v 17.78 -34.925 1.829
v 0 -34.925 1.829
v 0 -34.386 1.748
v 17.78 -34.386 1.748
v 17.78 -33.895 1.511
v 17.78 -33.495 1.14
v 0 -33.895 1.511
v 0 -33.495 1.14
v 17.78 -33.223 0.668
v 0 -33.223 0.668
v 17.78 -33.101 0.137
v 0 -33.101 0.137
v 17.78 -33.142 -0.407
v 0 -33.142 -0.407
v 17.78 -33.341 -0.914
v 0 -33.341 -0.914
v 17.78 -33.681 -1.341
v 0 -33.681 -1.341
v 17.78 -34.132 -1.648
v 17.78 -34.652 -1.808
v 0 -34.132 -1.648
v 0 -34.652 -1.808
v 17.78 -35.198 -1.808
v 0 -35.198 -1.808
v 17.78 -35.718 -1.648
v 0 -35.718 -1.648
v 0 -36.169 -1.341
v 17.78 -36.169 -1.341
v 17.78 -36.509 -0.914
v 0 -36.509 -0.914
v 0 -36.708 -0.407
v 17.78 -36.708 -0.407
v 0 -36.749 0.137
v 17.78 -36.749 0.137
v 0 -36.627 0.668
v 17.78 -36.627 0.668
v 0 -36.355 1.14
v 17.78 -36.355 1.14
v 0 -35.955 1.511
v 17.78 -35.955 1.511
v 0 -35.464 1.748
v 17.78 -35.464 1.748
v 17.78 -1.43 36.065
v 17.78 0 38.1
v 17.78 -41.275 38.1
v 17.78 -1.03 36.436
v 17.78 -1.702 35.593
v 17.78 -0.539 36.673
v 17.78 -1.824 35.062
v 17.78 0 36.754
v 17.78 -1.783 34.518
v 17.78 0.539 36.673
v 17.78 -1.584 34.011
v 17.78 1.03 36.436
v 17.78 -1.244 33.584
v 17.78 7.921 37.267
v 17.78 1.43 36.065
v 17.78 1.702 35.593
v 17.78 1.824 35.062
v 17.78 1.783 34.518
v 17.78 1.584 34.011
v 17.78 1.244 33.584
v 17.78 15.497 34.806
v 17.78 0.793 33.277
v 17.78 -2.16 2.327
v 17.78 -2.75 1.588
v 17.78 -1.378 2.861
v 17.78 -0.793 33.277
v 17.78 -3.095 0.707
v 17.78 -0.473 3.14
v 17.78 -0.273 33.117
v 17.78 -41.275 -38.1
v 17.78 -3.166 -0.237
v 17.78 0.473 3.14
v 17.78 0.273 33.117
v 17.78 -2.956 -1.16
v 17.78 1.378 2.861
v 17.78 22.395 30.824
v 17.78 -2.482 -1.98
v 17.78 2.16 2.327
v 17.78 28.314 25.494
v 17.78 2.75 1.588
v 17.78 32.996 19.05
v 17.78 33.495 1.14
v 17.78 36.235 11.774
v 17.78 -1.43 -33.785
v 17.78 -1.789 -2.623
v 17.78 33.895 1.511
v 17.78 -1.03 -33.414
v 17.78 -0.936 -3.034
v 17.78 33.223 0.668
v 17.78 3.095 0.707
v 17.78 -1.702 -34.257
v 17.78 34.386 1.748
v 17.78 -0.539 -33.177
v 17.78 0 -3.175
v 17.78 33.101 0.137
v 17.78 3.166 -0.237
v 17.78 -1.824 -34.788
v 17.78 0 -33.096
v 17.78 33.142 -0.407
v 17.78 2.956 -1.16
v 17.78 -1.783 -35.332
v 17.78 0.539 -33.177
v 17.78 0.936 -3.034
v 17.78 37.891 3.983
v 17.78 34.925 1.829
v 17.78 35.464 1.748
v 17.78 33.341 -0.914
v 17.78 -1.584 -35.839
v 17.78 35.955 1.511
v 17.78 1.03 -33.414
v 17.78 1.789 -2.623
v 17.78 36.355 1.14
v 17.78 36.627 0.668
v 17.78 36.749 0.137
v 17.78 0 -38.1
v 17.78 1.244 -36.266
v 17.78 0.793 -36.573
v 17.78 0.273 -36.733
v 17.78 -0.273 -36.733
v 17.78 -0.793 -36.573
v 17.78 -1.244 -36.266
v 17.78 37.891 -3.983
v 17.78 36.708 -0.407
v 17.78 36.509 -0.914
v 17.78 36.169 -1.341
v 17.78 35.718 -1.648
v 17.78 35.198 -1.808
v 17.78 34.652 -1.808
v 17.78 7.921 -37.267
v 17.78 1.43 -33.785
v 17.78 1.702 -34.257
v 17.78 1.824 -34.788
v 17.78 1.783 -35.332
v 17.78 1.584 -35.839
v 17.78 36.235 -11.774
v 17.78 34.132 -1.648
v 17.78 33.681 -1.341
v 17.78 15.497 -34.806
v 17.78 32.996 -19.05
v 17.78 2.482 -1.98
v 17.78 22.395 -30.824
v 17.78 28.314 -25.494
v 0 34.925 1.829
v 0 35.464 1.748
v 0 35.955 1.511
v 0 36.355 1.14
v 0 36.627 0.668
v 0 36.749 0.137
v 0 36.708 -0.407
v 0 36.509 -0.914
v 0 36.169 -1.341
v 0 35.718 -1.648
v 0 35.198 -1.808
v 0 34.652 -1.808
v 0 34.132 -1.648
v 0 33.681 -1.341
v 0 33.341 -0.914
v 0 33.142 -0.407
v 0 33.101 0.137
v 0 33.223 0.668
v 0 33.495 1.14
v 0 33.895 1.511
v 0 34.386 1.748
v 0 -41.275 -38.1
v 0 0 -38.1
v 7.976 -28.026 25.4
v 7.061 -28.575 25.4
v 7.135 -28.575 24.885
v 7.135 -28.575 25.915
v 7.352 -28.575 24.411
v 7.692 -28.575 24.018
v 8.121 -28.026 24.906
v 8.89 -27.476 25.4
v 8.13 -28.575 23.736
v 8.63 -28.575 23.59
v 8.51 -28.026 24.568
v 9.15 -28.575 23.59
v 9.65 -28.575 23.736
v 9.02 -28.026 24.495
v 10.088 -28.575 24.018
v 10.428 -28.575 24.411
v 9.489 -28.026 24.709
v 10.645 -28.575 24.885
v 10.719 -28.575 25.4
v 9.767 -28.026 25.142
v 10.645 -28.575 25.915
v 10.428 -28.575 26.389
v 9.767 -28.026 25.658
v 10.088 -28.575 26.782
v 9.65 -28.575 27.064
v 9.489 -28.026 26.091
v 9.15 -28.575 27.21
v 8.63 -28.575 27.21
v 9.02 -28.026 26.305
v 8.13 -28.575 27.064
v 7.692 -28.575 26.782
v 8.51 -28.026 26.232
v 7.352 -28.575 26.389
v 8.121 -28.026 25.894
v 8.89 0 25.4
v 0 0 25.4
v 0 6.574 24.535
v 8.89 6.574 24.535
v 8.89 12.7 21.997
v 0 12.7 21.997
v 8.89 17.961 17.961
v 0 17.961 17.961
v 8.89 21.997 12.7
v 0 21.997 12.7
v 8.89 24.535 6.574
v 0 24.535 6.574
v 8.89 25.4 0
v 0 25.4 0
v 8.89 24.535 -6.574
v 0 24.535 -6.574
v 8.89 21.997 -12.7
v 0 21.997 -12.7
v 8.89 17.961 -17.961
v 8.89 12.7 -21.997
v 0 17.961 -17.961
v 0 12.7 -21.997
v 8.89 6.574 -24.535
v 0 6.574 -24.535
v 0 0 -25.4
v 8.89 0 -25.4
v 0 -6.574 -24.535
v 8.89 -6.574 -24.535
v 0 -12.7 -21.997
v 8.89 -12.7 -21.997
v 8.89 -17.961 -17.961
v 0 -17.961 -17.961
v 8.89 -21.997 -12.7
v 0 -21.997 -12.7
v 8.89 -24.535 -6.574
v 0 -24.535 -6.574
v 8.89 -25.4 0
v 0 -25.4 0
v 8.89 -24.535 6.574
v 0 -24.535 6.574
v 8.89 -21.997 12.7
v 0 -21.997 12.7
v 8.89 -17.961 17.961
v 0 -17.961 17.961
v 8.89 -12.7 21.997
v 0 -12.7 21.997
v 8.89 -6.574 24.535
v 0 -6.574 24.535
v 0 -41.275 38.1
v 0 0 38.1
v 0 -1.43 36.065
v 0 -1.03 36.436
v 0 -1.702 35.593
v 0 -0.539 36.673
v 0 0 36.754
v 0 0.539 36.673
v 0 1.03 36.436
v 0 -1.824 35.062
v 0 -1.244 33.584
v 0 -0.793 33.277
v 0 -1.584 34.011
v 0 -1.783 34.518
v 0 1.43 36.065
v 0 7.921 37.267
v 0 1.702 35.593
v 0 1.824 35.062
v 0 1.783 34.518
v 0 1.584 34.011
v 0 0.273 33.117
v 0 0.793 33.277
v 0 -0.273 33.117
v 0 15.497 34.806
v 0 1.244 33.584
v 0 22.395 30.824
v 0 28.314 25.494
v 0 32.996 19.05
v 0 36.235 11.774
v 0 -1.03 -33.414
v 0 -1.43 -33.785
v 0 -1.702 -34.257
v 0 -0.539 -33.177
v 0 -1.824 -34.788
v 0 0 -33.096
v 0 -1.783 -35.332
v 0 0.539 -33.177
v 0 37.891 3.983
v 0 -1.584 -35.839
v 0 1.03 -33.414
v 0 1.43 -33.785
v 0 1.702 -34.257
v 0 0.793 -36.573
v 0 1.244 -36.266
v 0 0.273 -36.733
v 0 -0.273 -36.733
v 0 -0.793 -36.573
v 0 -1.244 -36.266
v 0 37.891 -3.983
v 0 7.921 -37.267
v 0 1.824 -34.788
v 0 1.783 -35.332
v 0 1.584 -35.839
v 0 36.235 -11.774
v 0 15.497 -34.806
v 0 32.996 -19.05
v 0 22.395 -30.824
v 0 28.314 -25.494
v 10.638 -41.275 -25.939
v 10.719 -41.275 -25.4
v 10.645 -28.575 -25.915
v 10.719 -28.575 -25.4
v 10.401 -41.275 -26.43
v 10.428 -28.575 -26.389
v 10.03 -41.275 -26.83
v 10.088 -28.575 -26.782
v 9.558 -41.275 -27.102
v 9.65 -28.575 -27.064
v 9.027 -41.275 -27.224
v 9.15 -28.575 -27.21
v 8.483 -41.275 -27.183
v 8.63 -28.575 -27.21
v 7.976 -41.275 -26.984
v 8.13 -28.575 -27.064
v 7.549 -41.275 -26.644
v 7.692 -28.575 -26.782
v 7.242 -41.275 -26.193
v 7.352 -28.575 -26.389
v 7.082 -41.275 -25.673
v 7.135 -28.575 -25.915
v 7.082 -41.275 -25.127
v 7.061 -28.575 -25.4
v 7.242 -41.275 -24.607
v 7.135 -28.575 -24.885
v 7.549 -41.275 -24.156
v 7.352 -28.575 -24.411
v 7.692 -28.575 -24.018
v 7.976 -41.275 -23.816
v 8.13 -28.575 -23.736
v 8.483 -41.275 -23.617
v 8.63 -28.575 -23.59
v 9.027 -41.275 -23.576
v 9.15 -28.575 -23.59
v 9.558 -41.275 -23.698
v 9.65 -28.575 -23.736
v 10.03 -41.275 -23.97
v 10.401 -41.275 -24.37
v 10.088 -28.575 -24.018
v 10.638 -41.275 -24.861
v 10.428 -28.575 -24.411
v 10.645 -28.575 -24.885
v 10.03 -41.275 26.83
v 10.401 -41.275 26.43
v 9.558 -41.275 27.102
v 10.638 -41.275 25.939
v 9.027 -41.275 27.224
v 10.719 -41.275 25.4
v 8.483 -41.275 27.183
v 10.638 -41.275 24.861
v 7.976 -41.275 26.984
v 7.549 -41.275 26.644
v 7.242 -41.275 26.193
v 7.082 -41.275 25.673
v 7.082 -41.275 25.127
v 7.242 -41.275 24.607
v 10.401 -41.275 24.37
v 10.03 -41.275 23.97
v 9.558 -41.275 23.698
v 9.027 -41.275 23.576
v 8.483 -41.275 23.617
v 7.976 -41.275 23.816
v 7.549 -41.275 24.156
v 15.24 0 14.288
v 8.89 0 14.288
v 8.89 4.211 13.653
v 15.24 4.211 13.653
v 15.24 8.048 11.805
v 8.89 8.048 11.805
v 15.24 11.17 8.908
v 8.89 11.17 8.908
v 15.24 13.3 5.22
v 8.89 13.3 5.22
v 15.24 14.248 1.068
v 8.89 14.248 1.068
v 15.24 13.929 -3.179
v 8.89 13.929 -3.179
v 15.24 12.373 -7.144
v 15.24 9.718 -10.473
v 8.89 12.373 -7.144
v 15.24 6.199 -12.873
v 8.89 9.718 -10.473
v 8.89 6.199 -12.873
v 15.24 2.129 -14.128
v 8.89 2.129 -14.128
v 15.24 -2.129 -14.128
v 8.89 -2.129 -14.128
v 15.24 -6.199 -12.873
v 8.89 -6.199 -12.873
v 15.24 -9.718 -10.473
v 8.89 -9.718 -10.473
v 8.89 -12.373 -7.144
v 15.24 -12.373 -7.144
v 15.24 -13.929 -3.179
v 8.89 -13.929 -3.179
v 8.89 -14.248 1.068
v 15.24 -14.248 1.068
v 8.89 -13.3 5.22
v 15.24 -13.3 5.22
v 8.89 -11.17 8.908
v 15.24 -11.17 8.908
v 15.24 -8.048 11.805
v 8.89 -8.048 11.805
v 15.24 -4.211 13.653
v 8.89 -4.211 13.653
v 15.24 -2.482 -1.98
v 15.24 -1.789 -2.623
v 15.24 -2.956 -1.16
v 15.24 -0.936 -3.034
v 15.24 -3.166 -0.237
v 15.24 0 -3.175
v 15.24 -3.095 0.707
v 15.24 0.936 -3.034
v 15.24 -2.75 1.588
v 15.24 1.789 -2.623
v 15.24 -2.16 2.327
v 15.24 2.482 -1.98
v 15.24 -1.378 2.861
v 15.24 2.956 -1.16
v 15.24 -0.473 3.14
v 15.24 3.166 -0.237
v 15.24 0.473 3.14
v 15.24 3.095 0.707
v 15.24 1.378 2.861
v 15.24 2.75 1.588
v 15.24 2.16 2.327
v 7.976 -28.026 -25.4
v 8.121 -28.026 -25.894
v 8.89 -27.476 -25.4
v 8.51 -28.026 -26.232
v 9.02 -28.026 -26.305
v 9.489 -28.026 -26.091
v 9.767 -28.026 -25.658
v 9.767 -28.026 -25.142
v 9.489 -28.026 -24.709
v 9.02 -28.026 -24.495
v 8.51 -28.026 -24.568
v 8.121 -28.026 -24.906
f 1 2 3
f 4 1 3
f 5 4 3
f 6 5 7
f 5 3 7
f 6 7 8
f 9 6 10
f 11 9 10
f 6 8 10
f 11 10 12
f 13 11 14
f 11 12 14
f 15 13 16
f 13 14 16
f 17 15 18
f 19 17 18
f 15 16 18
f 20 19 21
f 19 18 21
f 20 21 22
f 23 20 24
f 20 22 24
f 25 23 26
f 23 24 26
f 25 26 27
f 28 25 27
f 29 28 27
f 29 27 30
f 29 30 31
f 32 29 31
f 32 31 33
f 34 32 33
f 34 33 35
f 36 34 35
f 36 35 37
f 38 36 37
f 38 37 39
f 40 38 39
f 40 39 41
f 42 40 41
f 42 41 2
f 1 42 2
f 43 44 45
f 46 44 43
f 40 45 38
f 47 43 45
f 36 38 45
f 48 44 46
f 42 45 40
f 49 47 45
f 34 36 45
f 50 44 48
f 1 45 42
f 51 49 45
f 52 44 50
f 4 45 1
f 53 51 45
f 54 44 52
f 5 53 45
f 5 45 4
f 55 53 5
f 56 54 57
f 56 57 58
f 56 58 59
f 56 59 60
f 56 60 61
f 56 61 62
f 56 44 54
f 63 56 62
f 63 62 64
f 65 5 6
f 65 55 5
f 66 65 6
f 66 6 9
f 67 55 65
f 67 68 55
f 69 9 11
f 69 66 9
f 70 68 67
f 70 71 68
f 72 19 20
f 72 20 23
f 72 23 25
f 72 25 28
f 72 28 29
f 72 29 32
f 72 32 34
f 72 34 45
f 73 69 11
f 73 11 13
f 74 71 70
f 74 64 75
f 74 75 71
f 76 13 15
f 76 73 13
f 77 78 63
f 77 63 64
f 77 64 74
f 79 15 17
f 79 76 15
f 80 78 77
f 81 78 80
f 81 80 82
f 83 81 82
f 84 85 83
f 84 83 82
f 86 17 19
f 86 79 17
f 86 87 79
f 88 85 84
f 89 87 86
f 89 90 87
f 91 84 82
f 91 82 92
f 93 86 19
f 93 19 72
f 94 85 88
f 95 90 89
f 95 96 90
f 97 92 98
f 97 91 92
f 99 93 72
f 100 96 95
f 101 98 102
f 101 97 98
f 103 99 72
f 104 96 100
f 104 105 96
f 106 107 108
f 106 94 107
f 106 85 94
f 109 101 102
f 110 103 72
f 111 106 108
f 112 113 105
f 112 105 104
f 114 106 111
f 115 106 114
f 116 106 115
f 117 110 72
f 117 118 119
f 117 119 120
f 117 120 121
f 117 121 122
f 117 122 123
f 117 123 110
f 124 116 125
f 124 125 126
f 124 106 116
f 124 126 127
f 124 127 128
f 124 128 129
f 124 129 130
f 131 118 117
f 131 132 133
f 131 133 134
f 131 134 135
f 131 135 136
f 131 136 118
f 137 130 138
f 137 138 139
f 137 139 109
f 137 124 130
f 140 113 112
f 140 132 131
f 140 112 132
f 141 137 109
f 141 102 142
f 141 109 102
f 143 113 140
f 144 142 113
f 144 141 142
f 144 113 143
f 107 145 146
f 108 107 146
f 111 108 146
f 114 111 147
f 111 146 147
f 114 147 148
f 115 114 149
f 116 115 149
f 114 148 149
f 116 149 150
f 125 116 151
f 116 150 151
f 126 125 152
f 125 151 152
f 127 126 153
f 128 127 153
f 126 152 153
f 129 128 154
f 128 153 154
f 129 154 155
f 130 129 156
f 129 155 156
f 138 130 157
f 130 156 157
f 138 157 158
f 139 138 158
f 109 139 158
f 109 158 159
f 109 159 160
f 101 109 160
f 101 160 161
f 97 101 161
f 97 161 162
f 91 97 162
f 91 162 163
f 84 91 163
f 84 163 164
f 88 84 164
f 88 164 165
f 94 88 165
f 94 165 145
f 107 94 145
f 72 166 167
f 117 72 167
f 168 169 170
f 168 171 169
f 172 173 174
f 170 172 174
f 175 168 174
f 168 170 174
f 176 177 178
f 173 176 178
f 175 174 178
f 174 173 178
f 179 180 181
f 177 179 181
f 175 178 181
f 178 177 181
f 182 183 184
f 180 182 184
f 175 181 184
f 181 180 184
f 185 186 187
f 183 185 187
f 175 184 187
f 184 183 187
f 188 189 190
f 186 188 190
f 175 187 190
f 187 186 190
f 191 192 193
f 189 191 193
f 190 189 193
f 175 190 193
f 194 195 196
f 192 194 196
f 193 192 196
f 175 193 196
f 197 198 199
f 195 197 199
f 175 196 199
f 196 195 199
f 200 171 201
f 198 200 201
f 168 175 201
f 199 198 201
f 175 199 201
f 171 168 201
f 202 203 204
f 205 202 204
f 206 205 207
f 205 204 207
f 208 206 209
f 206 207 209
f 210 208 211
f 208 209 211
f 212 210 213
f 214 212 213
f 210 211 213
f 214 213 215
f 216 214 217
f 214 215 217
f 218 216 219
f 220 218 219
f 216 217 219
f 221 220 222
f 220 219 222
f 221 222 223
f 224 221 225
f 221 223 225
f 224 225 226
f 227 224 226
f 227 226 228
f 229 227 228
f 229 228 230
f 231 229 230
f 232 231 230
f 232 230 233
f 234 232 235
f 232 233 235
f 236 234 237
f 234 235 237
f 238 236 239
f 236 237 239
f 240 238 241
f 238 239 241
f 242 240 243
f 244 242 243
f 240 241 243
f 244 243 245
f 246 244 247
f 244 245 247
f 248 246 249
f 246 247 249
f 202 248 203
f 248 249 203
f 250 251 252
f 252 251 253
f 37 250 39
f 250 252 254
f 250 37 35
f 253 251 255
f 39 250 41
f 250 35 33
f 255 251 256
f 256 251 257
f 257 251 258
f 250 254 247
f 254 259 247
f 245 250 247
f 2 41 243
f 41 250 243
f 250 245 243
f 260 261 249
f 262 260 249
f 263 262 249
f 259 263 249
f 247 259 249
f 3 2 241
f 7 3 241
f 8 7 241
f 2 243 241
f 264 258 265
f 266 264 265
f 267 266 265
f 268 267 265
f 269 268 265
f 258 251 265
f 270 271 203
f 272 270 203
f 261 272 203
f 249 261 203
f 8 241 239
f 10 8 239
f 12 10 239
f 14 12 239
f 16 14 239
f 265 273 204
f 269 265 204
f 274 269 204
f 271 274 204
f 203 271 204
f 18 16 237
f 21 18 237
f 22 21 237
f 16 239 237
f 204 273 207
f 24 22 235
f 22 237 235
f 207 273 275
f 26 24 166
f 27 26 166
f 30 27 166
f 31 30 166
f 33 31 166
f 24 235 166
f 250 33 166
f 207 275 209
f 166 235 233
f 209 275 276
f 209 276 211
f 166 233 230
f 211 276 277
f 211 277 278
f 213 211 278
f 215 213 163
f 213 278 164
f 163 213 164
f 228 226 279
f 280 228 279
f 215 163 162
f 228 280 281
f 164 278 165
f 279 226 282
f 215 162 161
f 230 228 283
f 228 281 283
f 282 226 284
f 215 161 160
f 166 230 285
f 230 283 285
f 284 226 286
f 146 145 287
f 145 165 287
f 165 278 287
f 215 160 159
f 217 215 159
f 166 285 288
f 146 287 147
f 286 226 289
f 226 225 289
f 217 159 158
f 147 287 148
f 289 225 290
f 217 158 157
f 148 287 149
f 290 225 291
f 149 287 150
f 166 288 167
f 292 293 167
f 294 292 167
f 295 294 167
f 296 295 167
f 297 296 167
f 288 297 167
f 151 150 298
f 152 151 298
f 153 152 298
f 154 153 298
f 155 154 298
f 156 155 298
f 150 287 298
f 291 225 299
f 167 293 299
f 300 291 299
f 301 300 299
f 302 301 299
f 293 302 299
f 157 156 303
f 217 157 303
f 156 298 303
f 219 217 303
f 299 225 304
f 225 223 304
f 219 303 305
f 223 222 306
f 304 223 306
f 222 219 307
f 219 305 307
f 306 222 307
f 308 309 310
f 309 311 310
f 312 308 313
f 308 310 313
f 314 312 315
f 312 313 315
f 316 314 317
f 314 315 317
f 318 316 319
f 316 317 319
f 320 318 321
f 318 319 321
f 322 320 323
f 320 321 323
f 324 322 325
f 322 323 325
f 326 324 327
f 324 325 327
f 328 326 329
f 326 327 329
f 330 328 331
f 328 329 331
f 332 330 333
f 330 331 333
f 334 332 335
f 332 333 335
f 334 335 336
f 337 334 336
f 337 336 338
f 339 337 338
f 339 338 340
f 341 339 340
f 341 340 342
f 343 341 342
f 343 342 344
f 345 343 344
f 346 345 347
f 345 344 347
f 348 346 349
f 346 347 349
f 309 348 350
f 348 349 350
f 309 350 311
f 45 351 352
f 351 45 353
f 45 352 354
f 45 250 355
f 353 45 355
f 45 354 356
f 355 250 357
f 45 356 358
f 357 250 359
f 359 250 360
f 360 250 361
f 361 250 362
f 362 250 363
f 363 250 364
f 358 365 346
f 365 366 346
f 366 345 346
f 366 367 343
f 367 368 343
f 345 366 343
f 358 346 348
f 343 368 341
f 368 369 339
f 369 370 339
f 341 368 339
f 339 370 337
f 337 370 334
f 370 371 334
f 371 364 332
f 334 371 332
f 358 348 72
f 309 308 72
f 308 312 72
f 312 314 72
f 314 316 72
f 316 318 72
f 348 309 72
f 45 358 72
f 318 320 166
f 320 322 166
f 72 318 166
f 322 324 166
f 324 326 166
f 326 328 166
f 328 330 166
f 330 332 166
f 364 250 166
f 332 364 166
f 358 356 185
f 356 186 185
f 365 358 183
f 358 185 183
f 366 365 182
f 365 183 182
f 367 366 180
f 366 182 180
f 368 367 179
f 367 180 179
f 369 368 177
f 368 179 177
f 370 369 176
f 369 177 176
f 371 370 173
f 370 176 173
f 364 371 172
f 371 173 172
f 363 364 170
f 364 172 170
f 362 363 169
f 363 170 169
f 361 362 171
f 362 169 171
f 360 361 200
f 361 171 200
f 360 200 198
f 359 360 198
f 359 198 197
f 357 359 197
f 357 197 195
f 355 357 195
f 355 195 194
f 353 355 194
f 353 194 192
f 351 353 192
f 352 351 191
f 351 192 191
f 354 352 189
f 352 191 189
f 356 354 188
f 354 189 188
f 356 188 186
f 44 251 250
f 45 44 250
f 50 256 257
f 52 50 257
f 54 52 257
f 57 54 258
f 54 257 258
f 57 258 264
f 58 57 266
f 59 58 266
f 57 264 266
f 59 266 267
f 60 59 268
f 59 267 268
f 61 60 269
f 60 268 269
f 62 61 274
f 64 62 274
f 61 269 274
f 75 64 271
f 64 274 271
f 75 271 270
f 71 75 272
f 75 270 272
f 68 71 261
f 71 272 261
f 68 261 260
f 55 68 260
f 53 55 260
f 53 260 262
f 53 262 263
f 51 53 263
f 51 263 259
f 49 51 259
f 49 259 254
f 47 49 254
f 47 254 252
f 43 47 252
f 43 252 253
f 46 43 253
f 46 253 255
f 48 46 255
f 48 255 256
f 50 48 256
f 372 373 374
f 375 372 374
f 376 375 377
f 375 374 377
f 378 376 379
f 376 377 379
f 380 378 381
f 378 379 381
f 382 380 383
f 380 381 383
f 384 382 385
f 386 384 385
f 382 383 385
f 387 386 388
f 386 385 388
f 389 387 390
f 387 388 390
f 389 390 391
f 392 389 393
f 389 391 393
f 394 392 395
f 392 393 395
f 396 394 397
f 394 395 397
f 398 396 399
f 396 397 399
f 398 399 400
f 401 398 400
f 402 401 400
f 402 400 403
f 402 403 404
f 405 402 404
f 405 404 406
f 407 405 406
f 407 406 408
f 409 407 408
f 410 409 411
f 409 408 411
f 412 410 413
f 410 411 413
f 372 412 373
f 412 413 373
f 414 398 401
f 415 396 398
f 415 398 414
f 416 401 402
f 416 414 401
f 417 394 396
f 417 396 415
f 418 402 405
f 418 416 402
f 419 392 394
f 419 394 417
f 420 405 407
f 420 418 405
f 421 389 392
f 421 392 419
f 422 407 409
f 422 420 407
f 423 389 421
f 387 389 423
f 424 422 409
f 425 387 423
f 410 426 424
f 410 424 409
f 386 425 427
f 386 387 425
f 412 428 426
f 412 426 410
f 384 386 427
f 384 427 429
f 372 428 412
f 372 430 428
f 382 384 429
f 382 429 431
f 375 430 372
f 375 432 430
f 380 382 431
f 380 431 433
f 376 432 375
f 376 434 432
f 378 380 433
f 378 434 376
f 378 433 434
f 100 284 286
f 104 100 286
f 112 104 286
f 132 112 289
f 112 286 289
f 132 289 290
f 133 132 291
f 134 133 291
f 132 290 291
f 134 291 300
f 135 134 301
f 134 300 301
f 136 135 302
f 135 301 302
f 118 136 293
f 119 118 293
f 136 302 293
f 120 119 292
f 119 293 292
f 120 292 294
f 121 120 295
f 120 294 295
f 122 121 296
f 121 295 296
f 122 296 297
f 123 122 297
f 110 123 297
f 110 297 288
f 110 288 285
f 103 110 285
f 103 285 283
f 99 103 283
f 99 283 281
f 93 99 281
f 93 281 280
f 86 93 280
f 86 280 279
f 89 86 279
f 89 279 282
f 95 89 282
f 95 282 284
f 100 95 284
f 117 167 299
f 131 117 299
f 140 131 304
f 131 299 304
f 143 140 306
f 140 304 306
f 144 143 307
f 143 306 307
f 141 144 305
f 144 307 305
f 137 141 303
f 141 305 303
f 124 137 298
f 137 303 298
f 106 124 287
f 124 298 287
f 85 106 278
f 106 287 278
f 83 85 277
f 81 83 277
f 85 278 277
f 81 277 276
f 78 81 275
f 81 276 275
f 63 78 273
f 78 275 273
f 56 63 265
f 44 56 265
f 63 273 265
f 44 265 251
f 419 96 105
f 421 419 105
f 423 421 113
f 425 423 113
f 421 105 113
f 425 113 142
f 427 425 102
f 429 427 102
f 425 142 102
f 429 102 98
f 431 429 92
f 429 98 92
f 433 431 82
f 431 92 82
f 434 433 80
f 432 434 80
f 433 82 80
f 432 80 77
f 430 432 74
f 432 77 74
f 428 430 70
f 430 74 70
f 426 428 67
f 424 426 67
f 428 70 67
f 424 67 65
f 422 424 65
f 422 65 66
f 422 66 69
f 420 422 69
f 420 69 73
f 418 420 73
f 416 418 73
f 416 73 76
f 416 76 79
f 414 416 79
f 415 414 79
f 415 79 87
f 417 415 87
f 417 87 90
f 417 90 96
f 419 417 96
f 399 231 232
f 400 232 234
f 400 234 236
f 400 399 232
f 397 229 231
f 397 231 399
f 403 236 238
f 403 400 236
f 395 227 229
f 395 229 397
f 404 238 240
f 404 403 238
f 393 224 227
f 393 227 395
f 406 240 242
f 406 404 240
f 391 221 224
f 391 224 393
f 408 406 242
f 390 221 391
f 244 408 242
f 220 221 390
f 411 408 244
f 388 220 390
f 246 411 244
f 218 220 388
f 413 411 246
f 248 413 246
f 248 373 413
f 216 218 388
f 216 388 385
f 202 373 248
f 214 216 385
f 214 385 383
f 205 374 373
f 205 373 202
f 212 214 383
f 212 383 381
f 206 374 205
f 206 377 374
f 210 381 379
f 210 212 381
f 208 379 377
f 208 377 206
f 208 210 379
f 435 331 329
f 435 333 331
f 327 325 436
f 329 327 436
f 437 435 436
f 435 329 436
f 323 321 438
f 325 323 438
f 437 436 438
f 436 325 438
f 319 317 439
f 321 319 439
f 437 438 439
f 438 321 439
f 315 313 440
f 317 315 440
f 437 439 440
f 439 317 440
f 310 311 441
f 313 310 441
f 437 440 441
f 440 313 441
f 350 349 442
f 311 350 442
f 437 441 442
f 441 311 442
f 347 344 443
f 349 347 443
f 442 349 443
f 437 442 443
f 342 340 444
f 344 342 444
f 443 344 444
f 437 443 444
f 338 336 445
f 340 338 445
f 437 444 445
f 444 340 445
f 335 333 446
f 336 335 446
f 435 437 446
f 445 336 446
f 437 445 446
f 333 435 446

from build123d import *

# Parameters (mm, degrees)
SKETCH1_R                 = 38.1
BOSS_EXTRUDE1_DEPTH       = 17.78
SKETCH2_R                 = 25.4
CUT_EXTRUDE1_DEPTH        = 8.89
F_6_CLEARANCE_HOLE1_D     = 3.6576
SKETCH6_R                 = 14.2875
CUT_EXTRUDE2_DEPTH        = 6.35
SKETCH7_R                 = 3.175
CUT_EXTRUDE3_DEPTH        = 59.918282604
F_6_CLEARANCE_HOLE2_D     = 3.6576
F_6_CLEARANCE_HOLE2_DEPTH = 12.7
F_6_CLEARANCE_HOLE2_TIP   = 1.0988539


with BuildPart() as part:
    # Sketch1 → Boss-Extrude1 (new body)
    with BuildSketch(Plane(origin=(0, 0, 0), x_dir=(0, 0, -1), z_dir=(1, 0, 0))):
        with BuildLine():
            ThreePointArc((38.1, 0), (0, -38.1), (-38.1, 0))
            Line((-38.1, 0), (-38.1, -41.275))
            Line((-38.1, -41.275), (38.1, -41.275))
            Line((38.1, -41.275), (38.1, 0))
        make_face()
        Circle(SKETCH1_R)
    extrude(amount=BOSS_EXTRUDE1_DEPTH)

    # Sketch2 → Cut-Extrude1 (cut)
    with BuildSketch(Plane.ZY):
        Circle(SKETCH2_R)
    extrude(amount=-CUT_EXTRUDE1_DEPTH, mode=Mode.SUBTRACT)

    # #6 Clearance Hole1 (through all)
    with Locations(Plane(origin=(17.78, 0, 0), x_dir=(0, 0, -1), z_dir=(1, 0, 0))):
        with Locations((0, 34.925), (34.925, 0), (0, -34.925), (-34.925, 0)):
            Hole(F_6_CLEARANCE_HOLE1_D / 2)

    # Sketch6 → Cut-Extrude2 (cut)
    with BuildSketch(Plane.ZY.offset(-8.89)):
        Circle(SKETCH6_R)
    extrude(amount=-CUT_EXTRUDE2_DEPTH, mode=Mode.SUBTRACT)

    # Sketch7 → Cut-Extrude3 (cut, through all)
    with BuildSketch(Plane(origin=(17.78, 0, 0), x_dir=(0, 0, -1), z_dir=(1, 0, 0))):
        Circle(SKETCH7_R)
    extrude(amount=-CUT_EXTRUDE3_DEPTH, mode=Mode.SUBTRACT)

    # #6 Clearance Hole2
    with Locations(Plane(origin=(0, -41.275, 0), x_dir=(-1, 0, 0), z_dir=(0, -1, 0))):
        with Locations((-8.89, 25.4), (-8.89, -25.4)):
            Hole(F_6_CLEARANCE_HOLE2_D / 2, depth=F_6_CLEARANCE_HOLE2_DEPTH)
            with Locations((0, 0, -(F_6_CLEARANCE_HOLE2_DEPTH + F_6_CLEARANCE_HOLE2_TIP / 2))):  # 118° drill point
                Cone(0, F_6_CLEARANCE_HOLE2_D / 2, F_6_CLEARANCE_HOLE2_TIP, mode=Mode.SUBTRACT)


solid = part.part
